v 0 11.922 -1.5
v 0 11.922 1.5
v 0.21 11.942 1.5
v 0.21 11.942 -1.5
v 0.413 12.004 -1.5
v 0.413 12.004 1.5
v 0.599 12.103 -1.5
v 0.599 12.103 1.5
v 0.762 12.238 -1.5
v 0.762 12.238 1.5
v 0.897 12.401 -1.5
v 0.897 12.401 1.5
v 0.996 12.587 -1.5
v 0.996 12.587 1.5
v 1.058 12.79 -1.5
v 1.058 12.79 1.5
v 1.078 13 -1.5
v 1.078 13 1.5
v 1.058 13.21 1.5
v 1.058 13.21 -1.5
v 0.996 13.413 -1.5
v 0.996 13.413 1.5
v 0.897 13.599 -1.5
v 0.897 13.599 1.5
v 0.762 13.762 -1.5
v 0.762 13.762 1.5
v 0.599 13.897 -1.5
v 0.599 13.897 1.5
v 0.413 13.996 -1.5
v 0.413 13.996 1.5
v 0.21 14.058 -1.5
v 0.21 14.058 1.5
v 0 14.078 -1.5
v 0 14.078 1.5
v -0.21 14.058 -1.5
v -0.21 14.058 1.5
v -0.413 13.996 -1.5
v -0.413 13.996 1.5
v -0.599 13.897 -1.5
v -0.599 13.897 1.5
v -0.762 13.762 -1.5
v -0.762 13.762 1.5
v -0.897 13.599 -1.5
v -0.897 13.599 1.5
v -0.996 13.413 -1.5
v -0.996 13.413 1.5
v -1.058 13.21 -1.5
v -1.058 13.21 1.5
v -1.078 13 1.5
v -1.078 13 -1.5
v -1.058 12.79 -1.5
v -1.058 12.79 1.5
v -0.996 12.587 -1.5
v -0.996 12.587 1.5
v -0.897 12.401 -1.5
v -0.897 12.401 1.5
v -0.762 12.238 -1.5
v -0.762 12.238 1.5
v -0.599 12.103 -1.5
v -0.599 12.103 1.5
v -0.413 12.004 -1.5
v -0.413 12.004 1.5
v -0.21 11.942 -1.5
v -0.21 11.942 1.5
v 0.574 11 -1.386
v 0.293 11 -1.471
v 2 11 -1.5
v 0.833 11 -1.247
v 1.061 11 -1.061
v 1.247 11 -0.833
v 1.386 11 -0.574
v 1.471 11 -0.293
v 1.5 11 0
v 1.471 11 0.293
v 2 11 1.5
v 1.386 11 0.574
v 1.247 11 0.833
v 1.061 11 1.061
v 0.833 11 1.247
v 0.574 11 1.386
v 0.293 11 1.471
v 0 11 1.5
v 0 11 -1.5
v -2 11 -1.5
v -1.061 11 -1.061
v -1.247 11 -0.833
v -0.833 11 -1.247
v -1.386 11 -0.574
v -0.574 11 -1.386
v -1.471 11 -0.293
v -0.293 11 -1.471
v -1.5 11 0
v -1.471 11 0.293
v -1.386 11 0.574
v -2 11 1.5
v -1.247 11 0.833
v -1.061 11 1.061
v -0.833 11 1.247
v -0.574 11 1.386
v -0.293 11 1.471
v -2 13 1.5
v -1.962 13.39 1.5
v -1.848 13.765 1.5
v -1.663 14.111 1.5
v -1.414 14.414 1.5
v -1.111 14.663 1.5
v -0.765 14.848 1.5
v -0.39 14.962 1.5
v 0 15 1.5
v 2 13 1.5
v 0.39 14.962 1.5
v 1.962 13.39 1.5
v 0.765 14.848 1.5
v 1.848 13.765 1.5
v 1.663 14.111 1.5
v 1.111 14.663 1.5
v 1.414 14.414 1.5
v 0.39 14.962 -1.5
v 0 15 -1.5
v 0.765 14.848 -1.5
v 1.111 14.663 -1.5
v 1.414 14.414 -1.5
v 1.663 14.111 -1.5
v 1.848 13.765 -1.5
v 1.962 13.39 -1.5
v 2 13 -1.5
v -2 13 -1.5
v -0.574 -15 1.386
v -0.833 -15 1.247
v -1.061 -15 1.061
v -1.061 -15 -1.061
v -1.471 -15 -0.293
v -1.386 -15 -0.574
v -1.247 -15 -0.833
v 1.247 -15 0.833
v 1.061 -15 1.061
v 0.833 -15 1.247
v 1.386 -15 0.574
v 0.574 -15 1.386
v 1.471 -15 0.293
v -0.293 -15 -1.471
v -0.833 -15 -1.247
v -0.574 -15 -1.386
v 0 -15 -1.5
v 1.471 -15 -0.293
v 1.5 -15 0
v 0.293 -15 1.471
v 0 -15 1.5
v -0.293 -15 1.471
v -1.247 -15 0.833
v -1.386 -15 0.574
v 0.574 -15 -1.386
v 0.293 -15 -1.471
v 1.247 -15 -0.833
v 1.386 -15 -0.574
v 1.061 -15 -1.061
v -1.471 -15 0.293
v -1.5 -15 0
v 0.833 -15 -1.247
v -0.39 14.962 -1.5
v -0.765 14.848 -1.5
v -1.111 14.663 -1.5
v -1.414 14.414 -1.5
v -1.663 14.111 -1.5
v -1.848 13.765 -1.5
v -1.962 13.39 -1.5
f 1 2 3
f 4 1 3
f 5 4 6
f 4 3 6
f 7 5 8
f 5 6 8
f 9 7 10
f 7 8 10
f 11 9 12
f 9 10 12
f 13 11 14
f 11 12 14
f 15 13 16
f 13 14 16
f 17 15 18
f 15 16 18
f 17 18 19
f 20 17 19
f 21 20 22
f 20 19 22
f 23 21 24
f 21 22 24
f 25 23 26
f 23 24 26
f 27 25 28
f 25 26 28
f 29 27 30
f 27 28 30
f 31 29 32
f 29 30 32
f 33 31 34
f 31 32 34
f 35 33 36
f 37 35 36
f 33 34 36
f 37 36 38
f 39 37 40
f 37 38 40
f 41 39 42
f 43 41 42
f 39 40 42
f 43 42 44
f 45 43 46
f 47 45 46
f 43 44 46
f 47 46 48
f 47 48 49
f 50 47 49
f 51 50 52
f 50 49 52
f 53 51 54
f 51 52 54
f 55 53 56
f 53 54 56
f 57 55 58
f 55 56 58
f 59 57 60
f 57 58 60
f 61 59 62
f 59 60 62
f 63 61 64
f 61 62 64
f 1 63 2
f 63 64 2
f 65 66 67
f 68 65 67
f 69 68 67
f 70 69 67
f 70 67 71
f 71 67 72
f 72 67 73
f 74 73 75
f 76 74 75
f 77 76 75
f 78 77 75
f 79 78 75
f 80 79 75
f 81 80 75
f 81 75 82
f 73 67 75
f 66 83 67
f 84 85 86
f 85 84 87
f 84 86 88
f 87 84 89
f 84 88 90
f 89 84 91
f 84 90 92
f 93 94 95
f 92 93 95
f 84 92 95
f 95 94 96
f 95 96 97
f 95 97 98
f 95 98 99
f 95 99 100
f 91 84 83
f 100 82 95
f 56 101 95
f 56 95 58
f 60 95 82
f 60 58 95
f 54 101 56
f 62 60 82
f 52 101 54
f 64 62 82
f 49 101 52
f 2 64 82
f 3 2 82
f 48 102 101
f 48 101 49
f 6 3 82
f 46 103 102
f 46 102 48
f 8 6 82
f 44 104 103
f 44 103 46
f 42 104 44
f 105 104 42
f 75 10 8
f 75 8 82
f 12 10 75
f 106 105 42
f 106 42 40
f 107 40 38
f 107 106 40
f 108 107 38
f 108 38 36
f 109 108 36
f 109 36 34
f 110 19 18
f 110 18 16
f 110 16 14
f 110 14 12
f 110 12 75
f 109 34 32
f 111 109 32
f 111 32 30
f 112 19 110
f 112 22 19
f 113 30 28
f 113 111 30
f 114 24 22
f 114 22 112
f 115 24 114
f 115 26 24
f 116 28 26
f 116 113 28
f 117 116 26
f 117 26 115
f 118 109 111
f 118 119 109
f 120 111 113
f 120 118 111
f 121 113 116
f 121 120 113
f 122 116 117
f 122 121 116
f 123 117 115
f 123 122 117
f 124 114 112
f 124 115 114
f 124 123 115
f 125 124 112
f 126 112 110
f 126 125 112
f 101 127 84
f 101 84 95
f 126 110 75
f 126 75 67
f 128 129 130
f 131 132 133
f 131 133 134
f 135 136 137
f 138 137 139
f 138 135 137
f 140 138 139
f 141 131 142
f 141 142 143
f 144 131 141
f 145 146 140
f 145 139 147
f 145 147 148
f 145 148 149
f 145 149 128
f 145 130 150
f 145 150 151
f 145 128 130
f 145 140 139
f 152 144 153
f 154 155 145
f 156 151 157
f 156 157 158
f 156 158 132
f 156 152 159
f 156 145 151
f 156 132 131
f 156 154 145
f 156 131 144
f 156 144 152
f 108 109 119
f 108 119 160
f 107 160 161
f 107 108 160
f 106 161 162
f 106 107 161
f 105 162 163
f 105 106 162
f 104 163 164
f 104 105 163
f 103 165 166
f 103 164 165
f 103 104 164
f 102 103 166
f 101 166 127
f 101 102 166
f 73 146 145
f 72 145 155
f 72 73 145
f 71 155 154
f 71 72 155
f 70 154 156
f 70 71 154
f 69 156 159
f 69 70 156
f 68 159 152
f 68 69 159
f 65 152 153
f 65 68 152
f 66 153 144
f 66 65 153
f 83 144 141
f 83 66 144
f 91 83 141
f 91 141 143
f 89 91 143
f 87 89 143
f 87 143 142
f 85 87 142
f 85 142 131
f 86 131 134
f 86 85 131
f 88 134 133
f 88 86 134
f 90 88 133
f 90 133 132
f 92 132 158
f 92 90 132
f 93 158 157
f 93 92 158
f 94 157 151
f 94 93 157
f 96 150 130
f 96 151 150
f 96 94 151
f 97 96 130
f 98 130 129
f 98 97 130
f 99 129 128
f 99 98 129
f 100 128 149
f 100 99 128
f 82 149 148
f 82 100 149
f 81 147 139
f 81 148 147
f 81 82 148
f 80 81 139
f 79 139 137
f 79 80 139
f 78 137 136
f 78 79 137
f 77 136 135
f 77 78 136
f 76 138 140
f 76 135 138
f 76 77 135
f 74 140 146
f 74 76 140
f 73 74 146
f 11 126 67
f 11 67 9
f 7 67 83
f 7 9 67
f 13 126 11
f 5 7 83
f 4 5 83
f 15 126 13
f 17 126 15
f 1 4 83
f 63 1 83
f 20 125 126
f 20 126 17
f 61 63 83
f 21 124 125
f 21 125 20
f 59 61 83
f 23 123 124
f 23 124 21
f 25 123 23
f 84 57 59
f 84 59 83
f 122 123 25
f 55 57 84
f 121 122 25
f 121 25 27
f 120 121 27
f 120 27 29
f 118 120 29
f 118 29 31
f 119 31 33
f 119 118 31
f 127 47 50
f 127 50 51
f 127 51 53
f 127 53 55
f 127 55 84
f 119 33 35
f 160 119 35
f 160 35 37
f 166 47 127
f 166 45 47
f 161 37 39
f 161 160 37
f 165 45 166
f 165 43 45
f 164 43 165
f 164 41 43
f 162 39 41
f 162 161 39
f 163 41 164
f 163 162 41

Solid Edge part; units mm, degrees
sketch "Sketch1" plane through (0, 0, 0) normal (0, -1, 0) x (1, 0, 0)
  circle A0 centre (0, 0) radius 1.5
extrude "Protrusion1" add sketch "Sketch1" along normal mid plane 30
sketch "Sketch2" plane through (0, 15, 0) normal (0, 1, 0) x (1, 0, 0)
  line L0 (0, 1.5) -> (-2, 1.5)
  line L1 (-2, 1.5) -> (-2, -1.5)
  line L2 (-2, -1.5) -> (2, -1.5)
  line L3 (2, -1.5) -> (2, 1.5)
  line L4 (2, 1.5) -> (0, 1.5)
extrude "ExtrudedProtrusion_2" add sketch "Sketch2" against normal blind 4
hole "Hole_1" at (0, 13, 1.5) direction (0, 0, -1) diameter 2.1565 end up to next thread major 2.8448 thread length 50.8
fillet "Round_1" radius 2 2 edges at (-2, 15, 0) (2, 15, 0)
properties material "Aluminum, 6061-T6"
